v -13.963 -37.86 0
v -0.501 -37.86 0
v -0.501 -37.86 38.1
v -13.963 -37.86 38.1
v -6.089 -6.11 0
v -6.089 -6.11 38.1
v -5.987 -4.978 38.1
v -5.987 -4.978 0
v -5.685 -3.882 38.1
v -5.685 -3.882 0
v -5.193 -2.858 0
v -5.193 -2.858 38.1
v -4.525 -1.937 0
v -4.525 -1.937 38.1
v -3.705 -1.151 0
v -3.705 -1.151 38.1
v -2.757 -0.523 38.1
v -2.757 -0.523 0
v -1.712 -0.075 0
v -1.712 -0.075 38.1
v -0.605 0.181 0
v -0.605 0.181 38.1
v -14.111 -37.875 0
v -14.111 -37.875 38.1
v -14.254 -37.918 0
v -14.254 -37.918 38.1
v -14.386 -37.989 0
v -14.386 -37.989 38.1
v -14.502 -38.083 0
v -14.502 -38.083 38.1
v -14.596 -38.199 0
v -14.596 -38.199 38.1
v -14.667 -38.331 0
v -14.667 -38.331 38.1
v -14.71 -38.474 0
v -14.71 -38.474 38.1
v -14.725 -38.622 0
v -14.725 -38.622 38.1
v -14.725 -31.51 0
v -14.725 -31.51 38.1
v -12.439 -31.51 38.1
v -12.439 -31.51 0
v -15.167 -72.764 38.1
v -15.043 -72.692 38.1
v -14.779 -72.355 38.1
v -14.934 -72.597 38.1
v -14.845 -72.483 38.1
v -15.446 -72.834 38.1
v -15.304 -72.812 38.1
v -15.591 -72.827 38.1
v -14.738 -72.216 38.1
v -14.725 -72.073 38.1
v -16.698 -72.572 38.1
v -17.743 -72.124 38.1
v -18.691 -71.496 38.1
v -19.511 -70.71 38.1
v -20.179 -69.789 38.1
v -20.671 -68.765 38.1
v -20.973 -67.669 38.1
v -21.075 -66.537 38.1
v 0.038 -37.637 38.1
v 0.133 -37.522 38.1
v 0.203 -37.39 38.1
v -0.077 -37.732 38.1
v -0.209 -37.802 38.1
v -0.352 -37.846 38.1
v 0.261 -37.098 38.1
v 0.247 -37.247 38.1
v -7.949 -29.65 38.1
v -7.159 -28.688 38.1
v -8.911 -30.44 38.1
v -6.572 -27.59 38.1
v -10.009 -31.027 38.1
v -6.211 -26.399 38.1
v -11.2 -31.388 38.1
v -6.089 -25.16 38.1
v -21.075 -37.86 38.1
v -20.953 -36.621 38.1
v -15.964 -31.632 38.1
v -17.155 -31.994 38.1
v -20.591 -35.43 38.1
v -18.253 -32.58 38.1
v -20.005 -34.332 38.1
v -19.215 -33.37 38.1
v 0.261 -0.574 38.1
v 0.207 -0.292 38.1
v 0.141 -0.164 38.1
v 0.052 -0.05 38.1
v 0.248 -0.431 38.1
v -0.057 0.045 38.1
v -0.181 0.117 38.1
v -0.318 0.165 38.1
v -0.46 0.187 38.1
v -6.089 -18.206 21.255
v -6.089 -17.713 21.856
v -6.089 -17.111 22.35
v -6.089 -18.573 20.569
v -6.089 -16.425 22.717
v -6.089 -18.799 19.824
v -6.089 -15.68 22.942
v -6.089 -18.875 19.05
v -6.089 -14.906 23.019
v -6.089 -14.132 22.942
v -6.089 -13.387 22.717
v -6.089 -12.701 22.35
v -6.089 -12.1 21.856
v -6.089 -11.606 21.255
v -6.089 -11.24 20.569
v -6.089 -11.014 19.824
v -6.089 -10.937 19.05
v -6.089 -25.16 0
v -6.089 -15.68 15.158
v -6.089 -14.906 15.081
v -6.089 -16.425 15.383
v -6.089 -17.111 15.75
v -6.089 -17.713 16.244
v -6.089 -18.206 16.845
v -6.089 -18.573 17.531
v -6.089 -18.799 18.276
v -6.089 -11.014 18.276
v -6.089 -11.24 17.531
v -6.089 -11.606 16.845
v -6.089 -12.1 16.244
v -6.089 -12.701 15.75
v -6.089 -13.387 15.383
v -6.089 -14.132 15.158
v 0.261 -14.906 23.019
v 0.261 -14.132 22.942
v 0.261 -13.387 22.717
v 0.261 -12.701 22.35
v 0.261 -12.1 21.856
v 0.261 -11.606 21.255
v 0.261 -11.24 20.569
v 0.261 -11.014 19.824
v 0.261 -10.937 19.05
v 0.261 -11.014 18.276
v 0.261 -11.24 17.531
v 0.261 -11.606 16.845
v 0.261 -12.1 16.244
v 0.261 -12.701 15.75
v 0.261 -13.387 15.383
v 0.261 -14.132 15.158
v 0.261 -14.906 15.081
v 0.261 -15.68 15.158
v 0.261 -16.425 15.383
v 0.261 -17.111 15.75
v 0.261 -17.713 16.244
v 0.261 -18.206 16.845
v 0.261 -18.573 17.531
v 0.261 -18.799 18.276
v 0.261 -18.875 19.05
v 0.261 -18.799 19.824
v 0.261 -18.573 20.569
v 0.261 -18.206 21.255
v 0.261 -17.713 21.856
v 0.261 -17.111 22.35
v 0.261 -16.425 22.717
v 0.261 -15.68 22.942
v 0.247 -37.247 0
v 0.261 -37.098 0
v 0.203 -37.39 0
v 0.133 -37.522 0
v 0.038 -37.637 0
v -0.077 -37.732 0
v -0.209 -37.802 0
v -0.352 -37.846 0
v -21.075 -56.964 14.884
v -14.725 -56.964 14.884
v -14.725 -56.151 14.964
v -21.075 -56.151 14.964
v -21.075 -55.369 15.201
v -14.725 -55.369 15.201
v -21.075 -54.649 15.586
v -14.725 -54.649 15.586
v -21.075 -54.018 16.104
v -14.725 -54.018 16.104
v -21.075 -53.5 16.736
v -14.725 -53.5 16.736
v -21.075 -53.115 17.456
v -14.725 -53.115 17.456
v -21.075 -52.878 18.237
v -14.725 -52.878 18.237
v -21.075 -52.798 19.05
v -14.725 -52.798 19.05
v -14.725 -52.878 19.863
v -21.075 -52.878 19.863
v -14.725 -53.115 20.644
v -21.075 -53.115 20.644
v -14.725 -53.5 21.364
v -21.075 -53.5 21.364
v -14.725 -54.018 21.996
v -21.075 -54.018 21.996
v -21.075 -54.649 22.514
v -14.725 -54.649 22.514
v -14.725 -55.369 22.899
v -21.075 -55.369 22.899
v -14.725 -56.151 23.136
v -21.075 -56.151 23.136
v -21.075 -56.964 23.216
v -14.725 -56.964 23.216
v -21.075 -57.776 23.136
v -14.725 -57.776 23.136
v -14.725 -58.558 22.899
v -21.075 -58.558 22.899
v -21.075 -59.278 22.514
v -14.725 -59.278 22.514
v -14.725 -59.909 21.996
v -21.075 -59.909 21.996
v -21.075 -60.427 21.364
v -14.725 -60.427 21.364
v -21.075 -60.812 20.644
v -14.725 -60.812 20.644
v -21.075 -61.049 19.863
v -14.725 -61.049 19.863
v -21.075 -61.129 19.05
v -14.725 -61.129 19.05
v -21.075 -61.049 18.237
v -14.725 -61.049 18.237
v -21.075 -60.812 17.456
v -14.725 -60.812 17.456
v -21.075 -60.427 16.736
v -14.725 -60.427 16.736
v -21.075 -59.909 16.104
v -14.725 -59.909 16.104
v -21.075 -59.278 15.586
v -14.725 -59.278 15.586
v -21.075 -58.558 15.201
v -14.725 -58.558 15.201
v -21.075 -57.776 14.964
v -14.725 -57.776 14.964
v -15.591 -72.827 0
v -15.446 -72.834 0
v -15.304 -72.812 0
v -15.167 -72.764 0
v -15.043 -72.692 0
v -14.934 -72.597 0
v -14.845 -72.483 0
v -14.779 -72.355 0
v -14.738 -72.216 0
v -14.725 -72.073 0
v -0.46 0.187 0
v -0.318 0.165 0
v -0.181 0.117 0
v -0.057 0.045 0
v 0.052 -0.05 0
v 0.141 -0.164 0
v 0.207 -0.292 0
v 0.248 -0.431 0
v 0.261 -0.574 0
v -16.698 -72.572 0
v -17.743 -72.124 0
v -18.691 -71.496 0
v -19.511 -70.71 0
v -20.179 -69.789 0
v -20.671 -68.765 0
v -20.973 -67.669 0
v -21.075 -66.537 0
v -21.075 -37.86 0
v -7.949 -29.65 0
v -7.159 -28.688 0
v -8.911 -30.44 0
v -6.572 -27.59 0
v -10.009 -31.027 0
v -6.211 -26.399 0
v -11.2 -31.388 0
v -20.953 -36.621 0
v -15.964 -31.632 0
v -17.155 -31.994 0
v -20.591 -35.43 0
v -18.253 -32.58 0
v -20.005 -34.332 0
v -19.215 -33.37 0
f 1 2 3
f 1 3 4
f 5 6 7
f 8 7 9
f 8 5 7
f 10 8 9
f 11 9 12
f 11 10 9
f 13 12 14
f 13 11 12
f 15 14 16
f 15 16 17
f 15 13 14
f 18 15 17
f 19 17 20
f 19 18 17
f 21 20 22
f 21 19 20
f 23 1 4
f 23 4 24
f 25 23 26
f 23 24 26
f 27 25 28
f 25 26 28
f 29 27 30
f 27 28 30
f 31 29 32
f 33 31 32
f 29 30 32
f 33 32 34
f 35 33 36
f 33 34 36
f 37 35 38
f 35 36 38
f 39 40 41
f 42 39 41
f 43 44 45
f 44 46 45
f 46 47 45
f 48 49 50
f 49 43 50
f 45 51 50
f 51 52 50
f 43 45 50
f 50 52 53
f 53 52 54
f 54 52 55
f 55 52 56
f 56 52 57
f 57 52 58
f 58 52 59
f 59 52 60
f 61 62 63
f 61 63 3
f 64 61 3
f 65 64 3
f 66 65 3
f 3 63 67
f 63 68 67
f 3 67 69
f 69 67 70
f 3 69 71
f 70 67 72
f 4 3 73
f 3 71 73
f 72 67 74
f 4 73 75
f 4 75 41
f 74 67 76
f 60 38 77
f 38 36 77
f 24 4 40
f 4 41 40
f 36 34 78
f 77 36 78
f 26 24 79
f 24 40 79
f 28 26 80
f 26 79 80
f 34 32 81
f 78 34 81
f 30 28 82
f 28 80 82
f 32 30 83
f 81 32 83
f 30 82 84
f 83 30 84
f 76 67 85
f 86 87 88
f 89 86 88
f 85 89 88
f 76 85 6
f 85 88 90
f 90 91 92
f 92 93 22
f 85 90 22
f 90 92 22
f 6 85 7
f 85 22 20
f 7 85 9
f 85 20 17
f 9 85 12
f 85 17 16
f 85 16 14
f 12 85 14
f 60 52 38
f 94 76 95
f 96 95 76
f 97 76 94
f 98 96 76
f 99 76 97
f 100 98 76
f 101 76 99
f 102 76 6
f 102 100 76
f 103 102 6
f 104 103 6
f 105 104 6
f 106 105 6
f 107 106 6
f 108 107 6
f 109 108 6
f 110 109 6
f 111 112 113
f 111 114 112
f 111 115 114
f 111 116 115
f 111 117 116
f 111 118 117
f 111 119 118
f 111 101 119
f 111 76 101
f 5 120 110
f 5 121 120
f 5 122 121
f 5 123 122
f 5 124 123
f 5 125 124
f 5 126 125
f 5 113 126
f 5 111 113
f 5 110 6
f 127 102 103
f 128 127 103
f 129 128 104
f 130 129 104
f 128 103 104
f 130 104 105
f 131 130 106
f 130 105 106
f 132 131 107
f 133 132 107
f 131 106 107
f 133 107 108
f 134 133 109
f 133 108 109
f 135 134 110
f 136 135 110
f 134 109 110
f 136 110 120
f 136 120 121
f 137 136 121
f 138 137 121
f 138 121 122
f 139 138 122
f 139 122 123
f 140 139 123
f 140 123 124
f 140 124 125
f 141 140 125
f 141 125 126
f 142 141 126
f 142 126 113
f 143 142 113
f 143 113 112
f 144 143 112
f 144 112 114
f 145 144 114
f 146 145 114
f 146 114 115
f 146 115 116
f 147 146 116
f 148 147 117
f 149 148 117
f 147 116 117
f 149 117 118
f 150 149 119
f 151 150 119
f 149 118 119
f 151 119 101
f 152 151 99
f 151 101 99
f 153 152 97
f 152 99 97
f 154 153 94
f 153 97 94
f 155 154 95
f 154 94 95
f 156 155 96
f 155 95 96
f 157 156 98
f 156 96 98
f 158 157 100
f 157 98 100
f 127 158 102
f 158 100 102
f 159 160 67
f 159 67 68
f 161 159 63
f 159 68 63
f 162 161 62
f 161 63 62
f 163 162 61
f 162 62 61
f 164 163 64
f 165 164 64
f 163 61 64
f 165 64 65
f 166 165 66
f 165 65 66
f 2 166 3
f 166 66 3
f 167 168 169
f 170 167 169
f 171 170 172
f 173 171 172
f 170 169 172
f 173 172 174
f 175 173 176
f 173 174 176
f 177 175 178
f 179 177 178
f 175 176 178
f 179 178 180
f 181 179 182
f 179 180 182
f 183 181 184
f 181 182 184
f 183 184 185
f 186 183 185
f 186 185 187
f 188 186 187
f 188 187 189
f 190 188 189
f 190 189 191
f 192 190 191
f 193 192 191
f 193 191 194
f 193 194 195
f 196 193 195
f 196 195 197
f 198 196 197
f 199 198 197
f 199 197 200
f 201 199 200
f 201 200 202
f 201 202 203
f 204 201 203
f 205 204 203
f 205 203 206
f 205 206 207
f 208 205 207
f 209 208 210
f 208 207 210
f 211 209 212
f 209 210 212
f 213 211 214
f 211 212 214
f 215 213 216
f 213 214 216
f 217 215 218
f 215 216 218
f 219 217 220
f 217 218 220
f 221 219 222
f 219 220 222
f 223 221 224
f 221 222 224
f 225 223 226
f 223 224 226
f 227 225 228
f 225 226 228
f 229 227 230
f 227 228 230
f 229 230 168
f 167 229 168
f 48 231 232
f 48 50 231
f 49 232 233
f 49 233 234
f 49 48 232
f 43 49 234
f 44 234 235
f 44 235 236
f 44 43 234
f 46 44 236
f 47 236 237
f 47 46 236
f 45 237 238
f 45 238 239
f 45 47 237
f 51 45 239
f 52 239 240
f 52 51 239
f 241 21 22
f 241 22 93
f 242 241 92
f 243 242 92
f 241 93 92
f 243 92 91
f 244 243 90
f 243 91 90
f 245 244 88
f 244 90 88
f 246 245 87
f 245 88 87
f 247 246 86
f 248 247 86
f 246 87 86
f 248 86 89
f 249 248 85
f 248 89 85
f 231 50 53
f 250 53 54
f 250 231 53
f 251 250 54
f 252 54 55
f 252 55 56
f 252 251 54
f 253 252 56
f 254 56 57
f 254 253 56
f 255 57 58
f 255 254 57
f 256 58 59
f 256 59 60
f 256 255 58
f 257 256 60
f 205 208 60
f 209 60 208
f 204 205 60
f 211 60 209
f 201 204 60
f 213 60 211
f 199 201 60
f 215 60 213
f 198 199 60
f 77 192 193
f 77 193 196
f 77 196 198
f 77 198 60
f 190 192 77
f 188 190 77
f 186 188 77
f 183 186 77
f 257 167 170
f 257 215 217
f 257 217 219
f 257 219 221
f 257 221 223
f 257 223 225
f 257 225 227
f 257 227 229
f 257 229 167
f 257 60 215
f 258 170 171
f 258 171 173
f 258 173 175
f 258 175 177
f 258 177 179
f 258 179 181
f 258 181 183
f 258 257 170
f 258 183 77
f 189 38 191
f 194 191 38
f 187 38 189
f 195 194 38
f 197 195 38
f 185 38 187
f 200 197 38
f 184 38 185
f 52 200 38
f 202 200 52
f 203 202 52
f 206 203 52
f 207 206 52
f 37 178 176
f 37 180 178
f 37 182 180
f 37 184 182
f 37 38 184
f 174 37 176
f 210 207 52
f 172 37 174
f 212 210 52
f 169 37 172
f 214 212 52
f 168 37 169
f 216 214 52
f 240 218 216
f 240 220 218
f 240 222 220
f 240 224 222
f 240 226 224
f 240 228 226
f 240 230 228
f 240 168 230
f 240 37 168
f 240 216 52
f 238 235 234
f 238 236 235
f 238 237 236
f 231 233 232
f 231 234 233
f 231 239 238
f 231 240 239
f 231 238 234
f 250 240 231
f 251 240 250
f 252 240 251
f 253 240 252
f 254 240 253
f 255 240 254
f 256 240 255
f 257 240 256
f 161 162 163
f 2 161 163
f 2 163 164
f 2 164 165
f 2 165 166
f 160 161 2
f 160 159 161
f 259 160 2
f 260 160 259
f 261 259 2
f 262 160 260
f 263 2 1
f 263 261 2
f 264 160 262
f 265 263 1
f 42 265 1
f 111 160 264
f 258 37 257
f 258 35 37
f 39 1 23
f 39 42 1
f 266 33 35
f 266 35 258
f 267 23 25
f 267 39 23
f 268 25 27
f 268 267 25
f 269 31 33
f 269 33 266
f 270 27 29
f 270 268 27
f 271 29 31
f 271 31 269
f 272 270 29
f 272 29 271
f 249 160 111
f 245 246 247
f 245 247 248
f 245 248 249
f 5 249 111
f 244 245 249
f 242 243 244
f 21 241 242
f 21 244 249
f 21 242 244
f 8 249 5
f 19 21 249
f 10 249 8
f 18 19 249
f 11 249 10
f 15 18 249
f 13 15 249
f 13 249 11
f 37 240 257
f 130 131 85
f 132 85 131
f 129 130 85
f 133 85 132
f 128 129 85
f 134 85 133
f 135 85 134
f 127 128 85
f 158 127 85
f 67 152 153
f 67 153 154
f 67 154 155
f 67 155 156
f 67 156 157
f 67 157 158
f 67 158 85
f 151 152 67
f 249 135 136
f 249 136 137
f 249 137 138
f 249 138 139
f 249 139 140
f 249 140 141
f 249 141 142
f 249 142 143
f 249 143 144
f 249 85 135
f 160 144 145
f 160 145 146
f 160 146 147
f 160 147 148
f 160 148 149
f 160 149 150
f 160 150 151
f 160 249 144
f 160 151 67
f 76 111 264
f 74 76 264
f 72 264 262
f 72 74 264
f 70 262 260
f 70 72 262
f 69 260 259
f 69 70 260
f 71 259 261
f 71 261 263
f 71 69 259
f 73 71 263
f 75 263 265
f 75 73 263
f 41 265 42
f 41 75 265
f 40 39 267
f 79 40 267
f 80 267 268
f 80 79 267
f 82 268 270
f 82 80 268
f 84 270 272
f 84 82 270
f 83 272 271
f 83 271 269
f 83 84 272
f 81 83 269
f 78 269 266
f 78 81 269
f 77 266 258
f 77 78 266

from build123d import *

# Parameters (mm, degrees)
BOSS_EXTRUDE1_DEPTH      = 38.1
M7_CLEARANCE_HOLE1_D     = 7.9375
M7_CLEARANCE_HOLE1_DEPTH = 21.336
HOLE1_D                  = 8.3312
HOLE1_DEPTH              = 21.336
FILLET1_R                = 0.762
FILLET2_R                = 6.35


with BuildPart() as part:
    # Sketch1 → Boss-Extrude1 (new body)
    with BuildSketch(Plane(origin=(0, 0, 0), x_dir=(-1, 0, 0), z_dir=(0, 0, -1))):
        with BuildLine():
            Line((21.0747321, -31.51018077), (6.0887321, -31.51018077))
            Line((6.0887321, -31.51018077), (6.0887321, -6.11018077))
            ThreePointArc((6.0887321, -6.11018077), (4.228860161, -1.620052709), (-0.2612679, 0.23981923))
            Line((-0.2612679, 0.23981923), (-0.2612679, -37.86018077))
            Line((-0.2612679, -37.86018077), (14.7247321, -37.86018077))
            Line((14.7247321, -37.86018077), (14.7247321, -72.88678077))
            ThreePointArc((14.7247321, -72.88678077), (19.214860161, -71.02690883), (21.0747321, -66.53678077))
            Line((21.0747321, -66.53678077), (21.0747321, -31.51018077))
        make_face()
    extrude(amount=-BOSS_EXTRUDE1_DEPTH)

    # M7 Clearance Hole1
    with Locations(Plane(origin=(0.2612679, 0, 0), x_dir=(0, 0, -1), z_dir=(1, 0, 0))):
        with Locations((-19.05, -14.90620077)):
            Hole(M7_CLEARANCE_HOLE1_D / 2, depth=M7_CLEARANCE_HOLE1_DEPTH)

    # Hole1
    with Locations(Plane.ZY.offset(21.0747321)):
        with Locations((19.05, -56.96352077)):
            Hole(HOLE1_D / 2, depth=HOLE1_DEPTH)

    # Fillet1
    fillet1_edges = [part.edges().sort_by_distance(p)[0] for p in [
        (-14.7247321, -72.88678077, 19.05),
        (-14.7247321, -37.86018077, 19.05),
        (0.2612679, -37.86018077, 19.05),
        (0.2612679, 0.23981923, 19.05),
    ]]
    fillet(fillet1_edges, radius=FILLET1_R)

    # Fillet2
    fillet2_edges = [part.edges().sort_by_distance(p)[0] for p in [
        (-6.0887321, -31.51018077, 19.05),
        (-21.0747321, -31.51018077, 19.05),
    ]]
    fillet(fillet2_edges, radius=FILLET2_R)


solid = part.part
